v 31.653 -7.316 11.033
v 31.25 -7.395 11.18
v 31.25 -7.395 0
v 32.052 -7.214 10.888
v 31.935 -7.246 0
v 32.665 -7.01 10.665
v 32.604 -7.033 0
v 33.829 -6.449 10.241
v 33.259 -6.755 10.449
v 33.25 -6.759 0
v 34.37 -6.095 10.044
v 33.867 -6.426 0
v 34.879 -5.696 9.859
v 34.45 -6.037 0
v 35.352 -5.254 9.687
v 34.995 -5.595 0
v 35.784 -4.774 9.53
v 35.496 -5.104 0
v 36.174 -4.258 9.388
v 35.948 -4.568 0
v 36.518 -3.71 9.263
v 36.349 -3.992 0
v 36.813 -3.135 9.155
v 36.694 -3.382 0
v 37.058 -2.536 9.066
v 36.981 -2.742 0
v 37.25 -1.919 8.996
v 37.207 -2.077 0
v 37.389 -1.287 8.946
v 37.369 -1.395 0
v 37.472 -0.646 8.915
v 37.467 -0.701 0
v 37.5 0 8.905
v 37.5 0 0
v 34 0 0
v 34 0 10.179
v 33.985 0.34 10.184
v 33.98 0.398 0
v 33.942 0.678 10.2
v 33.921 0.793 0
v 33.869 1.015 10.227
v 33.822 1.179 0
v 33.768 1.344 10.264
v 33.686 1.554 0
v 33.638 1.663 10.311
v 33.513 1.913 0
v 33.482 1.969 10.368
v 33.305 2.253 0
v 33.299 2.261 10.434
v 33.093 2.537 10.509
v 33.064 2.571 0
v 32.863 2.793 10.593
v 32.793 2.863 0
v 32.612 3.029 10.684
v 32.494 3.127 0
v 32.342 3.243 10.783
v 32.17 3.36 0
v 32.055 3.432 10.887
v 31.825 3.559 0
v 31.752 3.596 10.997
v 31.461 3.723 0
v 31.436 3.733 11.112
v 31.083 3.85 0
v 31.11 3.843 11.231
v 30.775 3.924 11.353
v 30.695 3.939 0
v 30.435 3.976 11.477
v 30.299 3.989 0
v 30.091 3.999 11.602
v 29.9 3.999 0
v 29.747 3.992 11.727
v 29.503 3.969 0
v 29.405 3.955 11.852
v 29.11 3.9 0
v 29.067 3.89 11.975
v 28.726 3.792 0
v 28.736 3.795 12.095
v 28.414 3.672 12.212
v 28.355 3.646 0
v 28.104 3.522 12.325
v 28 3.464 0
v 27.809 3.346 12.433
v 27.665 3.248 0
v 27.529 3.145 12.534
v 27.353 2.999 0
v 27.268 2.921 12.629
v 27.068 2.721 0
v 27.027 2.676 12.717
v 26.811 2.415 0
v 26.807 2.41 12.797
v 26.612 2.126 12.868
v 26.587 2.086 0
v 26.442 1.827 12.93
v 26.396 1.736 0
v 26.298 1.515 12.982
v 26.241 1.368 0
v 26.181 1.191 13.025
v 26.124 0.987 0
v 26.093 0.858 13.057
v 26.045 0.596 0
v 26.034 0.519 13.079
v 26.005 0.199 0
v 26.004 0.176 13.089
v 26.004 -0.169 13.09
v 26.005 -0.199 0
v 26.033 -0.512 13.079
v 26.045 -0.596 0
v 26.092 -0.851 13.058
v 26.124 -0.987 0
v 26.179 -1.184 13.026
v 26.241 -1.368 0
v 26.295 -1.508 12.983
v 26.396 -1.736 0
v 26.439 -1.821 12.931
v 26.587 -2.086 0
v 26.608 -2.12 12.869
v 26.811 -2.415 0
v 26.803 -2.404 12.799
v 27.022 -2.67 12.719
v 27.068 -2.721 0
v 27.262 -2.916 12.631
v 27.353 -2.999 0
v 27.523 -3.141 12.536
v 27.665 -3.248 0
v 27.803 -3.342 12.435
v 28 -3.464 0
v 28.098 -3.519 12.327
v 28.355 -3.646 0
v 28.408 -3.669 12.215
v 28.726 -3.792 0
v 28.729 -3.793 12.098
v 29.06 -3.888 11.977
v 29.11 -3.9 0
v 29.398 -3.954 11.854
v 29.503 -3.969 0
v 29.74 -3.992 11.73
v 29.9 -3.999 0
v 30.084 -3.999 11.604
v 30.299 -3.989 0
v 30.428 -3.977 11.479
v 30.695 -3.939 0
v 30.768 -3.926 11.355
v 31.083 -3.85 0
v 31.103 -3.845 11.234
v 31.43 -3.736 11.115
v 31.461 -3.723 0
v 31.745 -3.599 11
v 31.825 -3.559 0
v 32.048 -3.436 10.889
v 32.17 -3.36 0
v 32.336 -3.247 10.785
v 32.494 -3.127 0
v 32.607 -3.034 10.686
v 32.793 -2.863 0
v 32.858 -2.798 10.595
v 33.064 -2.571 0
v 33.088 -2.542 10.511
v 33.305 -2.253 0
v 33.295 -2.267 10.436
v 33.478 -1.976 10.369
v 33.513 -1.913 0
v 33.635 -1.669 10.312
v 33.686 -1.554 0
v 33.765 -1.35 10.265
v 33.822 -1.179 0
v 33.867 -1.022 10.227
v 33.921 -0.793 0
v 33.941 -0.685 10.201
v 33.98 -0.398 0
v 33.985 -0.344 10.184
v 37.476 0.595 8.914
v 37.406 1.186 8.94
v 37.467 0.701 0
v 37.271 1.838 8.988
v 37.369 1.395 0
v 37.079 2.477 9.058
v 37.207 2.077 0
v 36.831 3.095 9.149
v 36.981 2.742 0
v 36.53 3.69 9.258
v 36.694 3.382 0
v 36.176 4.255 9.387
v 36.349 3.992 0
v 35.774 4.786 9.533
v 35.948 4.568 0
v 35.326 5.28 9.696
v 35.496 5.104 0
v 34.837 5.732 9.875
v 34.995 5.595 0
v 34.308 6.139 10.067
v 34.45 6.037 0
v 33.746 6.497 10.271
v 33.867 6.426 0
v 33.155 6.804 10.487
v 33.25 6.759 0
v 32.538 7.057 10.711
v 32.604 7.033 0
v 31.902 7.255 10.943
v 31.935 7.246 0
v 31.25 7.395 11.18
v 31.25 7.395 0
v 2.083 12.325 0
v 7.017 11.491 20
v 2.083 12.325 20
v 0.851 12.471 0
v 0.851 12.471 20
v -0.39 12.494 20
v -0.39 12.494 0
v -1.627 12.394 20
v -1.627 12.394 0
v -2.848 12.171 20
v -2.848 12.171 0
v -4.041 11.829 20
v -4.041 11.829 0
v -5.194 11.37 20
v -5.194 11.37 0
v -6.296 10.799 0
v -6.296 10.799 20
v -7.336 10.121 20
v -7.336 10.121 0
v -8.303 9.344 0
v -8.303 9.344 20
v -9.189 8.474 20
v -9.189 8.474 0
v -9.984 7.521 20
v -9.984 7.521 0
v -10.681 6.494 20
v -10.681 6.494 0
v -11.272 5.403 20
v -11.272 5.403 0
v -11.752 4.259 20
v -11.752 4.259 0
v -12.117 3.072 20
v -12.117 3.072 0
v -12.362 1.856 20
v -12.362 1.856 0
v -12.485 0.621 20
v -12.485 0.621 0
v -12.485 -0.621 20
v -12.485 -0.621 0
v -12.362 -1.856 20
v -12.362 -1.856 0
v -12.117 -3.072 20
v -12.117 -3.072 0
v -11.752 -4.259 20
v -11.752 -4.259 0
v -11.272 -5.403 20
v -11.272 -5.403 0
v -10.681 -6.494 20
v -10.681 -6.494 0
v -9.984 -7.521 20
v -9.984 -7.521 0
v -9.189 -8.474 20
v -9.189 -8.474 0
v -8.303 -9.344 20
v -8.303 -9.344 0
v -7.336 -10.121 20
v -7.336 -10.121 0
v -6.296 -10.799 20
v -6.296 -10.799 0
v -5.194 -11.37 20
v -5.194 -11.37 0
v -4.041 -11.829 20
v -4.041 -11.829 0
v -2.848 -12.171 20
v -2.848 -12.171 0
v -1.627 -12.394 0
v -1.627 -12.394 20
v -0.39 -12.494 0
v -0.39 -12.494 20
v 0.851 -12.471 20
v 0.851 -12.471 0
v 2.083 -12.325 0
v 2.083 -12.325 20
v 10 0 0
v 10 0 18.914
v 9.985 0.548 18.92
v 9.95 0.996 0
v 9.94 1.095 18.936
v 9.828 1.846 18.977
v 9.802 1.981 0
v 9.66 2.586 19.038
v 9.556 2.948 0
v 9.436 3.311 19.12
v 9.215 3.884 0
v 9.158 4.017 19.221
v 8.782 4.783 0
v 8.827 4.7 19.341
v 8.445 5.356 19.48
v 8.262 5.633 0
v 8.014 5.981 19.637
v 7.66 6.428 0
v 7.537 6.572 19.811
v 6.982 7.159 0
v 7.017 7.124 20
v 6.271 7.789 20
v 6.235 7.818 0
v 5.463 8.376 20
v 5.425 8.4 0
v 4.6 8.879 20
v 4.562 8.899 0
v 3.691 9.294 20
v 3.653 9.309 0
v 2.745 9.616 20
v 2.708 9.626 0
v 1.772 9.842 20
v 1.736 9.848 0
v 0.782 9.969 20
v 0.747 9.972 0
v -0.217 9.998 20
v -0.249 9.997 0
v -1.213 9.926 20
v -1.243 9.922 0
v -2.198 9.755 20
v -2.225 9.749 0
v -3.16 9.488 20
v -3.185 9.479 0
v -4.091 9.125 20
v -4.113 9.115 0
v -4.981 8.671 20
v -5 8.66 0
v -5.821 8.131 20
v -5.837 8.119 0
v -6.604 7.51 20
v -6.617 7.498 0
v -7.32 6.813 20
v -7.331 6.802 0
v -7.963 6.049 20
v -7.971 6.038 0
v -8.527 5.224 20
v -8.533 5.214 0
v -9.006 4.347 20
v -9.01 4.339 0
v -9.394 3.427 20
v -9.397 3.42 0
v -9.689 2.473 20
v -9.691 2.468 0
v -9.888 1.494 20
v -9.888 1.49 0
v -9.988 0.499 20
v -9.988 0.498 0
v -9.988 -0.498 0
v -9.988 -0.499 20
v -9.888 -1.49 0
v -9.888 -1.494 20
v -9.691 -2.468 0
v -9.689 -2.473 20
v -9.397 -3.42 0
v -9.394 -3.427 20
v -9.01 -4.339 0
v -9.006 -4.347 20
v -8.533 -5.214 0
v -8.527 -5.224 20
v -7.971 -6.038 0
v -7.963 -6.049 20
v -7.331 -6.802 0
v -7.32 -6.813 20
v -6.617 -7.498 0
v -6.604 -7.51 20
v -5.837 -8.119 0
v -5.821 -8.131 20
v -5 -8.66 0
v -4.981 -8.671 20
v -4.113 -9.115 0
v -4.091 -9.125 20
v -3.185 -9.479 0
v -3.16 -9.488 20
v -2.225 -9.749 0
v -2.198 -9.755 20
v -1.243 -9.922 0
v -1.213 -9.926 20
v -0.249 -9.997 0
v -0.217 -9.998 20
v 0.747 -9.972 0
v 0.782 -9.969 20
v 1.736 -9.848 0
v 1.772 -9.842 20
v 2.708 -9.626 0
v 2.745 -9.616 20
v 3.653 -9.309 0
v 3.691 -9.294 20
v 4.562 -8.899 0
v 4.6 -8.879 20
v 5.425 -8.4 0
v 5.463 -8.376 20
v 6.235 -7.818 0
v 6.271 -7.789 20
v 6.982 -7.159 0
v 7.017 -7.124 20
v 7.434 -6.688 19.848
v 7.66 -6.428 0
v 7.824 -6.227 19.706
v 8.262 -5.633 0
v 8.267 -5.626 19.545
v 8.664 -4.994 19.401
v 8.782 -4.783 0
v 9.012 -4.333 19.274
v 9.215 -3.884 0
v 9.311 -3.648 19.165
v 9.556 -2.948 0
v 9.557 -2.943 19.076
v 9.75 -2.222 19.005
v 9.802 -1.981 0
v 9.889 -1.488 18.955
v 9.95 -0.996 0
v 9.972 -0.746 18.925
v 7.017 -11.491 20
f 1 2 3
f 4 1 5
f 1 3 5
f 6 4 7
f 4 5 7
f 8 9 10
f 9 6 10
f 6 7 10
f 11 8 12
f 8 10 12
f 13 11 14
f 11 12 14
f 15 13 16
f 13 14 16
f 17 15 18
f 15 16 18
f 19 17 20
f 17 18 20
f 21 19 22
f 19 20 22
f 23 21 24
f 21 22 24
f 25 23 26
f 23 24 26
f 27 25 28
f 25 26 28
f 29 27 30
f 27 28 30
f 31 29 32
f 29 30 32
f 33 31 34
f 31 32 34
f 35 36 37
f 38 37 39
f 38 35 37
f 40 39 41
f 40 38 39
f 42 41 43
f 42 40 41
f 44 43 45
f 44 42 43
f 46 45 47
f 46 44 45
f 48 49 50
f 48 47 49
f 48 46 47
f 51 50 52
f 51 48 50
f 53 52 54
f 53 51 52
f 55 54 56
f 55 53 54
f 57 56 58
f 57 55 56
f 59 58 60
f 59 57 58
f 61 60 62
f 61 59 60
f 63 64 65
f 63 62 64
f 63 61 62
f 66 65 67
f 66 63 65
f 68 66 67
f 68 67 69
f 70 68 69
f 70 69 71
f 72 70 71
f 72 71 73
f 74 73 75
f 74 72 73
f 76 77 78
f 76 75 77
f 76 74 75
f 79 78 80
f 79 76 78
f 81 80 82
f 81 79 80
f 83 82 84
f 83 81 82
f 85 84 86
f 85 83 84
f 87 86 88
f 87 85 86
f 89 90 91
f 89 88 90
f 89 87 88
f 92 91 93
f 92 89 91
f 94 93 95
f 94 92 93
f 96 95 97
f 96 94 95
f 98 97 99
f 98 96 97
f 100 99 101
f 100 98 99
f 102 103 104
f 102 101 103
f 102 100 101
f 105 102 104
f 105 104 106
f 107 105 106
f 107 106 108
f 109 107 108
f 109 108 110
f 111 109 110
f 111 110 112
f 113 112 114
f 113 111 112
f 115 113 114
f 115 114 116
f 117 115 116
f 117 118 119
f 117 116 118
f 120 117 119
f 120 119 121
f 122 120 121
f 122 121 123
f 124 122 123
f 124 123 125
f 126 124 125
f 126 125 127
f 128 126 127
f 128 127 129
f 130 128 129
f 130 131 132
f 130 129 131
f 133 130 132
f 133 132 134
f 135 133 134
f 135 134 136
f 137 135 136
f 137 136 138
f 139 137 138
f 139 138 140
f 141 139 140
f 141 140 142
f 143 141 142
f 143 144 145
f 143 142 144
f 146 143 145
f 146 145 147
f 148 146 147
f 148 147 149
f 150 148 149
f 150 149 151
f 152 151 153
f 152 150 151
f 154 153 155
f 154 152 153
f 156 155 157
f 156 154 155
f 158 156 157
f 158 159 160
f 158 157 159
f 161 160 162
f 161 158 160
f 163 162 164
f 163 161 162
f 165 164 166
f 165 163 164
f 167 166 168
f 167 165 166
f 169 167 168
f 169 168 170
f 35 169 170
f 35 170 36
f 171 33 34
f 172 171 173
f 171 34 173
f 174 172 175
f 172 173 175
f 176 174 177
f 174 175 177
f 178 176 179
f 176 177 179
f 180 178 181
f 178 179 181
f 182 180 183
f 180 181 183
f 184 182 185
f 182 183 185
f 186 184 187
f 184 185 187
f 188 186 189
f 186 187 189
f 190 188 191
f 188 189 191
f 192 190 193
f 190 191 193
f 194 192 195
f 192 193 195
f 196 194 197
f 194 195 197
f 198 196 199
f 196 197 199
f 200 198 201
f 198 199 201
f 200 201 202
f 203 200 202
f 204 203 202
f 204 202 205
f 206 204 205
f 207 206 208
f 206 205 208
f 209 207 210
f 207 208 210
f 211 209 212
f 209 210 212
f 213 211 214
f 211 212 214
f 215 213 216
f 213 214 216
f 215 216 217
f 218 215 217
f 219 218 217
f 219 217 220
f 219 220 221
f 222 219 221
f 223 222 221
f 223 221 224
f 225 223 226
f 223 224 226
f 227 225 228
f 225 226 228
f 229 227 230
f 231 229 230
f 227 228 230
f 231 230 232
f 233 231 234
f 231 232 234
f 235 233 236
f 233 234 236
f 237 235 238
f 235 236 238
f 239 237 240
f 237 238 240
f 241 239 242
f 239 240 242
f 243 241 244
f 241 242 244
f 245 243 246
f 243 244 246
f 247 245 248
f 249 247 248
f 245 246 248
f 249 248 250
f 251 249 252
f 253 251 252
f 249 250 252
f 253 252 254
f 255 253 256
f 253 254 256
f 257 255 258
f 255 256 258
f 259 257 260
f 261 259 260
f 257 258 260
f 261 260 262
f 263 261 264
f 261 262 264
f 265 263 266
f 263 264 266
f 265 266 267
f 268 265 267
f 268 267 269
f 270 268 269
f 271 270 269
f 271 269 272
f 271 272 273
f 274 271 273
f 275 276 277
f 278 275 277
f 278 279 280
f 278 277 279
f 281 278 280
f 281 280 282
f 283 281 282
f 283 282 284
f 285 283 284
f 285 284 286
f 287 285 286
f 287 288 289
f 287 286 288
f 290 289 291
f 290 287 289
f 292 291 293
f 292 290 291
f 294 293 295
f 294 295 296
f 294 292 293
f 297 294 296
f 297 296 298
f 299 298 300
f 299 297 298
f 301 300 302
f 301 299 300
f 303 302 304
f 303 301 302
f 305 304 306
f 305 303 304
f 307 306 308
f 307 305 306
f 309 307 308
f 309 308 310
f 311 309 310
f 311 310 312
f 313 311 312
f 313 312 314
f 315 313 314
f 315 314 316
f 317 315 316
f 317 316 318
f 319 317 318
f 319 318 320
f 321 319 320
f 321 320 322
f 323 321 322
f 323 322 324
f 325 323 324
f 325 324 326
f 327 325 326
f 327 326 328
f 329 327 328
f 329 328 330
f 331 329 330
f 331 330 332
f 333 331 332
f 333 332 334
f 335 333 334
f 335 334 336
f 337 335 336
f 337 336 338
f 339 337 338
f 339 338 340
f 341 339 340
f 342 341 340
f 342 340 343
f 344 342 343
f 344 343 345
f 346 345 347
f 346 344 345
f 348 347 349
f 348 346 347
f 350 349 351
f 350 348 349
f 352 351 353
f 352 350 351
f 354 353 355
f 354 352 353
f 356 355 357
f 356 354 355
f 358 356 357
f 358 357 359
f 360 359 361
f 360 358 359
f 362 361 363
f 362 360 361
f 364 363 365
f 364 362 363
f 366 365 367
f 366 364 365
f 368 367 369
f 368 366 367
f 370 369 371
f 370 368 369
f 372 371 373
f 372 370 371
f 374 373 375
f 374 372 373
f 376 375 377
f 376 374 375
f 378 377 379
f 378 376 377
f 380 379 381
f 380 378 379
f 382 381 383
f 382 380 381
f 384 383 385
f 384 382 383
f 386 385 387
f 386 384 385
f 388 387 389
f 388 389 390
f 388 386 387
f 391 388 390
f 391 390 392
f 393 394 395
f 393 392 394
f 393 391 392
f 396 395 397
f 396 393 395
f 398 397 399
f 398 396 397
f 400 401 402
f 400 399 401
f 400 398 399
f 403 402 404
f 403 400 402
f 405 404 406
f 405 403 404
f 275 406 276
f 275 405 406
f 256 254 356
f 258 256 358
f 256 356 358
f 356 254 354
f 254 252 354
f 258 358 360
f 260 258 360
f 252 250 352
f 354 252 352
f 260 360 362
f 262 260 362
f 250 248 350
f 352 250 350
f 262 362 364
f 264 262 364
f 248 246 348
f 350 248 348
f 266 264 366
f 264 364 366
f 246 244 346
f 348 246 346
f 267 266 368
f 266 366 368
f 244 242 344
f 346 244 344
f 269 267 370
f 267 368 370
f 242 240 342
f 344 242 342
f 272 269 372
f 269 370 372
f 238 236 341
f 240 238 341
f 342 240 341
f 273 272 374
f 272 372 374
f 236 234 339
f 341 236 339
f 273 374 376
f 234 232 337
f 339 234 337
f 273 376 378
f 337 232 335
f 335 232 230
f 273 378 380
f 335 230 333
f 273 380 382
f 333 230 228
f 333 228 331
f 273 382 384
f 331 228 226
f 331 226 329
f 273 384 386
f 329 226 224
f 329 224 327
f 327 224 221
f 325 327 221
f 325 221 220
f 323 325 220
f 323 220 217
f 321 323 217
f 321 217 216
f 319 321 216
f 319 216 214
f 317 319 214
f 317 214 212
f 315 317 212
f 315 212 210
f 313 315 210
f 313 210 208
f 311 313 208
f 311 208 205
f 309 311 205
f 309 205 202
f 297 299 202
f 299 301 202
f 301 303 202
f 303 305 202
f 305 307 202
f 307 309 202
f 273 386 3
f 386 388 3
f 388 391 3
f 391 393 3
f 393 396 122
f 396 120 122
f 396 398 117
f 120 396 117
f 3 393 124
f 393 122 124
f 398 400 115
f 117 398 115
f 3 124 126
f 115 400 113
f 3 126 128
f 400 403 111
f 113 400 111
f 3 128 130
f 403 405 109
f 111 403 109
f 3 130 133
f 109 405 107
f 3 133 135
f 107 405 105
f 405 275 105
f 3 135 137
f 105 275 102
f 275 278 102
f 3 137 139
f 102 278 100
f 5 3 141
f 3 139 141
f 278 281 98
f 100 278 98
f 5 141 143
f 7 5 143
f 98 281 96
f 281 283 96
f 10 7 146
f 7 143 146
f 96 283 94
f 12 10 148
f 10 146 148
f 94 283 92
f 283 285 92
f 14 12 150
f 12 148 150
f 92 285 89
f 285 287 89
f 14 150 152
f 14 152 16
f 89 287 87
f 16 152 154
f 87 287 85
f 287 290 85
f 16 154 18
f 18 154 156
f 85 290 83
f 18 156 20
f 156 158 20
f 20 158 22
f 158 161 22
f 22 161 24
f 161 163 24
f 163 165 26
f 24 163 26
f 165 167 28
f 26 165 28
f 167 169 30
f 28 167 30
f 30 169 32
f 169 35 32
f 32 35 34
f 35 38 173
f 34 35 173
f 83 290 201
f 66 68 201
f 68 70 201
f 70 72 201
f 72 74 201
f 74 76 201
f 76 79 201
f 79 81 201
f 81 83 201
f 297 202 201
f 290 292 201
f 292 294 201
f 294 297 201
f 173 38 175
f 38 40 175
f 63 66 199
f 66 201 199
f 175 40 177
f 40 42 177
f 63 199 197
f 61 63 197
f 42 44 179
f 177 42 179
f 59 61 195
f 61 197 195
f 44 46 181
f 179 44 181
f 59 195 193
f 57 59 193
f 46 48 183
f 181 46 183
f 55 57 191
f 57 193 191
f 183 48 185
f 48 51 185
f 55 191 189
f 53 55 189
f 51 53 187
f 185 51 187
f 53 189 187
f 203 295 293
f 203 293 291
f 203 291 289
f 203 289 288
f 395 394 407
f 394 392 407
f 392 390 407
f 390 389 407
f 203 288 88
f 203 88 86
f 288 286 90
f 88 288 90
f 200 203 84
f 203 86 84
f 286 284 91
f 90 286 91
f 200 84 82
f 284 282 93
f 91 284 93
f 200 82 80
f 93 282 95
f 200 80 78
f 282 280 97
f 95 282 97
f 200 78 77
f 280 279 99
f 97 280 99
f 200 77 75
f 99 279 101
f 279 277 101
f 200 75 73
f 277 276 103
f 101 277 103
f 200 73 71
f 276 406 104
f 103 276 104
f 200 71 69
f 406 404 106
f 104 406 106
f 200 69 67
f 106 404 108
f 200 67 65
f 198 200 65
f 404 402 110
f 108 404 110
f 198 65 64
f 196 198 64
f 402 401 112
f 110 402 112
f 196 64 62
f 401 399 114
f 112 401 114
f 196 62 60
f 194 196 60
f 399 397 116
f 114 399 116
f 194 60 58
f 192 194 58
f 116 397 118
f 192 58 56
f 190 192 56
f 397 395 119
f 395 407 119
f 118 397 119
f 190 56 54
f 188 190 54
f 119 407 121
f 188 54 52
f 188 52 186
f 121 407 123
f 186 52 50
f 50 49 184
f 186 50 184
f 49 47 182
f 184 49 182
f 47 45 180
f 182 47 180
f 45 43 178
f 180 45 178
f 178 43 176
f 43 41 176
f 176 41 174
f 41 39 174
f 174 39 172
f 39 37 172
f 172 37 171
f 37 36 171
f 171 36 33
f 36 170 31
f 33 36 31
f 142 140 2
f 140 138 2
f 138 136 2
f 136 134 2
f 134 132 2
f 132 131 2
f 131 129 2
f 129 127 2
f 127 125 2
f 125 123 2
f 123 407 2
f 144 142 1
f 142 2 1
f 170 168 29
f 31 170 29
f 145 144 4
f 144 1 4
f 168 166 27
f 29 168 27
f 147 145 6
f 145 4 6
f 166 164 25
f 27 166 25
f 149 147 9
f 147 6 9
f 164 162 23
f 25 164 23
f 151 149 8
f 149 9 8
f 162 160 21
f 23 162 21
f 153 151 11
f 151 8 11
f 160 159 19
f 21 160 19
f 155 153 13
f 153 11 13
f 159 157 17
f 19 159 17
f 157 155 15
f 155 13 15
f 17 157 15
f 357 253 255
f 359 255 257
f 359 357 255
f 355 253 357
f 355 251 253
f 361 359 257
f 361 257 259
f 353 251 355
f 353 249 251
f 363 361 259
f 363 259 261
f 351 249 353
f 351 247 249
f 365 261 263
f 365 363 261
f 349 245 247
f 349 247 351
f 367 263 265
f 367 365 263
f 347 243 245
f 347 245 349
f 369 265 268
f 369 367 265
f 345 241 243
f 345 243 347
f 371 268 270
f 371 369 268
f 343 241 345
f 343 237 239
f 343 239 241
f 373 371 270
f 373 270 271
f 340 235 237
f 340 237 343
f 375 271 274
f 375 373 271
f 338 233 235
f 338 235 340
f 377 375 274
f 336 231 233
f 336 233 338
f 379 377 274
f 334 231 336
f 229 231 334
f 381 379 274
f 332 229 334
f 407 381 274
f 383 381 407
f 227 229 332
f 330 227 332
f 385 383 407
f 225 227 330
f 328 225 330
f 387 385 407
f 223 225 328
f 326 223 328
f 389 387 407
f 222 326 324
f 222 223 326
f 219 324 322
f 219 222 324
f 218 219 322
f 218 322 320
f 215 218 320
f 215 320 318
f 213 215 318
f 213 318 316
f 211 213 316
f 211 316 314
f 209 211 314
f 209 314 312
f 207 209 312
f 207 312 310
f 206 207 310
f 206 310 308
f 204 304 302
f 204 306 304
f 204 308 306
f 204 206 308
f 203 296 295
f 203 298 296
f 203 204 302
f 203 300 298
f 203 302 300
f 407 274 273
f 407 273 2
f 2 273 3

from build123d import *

# Parameters (mm, degrees)
F0_R     = 10
F0_R_2   = 4
F1_DEPTH = 20
F3_DEPTH = 12.5


with BuildPart() as f1:
    # F0 (on Top) → F1 (new body)
    with BuildSketch(Plane.XY):
        with BuildLine():
            ThreePointArc((2.083333, -12.325166), (9.547033, -8.068715), (12.5, 0))
            ThreePointArc((12.5, 0), (9.547033, 8.068715), (2.083333, 12.325166))
            ThreePointArc((2.083333, 12.325166), (-12.5, 0), (2.083333, -12.325166))
        make_face()
        Circle(F0_R, mode=Mode.SUBTRACT)
        with BuildLine():
            ThreePointArc((37.5, 0), (35.72822, 4.841229), (31.25, 7.3951))
            ThreePointArc((31.25, 7.3951), (22.5, 0), (31.25, -7.3951))
            ThreePointArc((31.25, -7.3951), (35.72822, -4.841229), (37.5, 0))
        make_face()
        with Locations((30, 0)):
            Circle(F0_R_2, mode=Mode.SUBTRACT)
        with BuildLine():
            ThreePointArc((2.083333, 12.325166), (9.547033, 8.068715), (12.5, 0))
            ThreePointArc((12.5, 0), (9.547033, -8.068715), (2.083333, -12.325166))
            Line((2.083333, -12.325166), (31.25, -7.3951))
            ThreePointArc((31.25, -7.3951), (22.5, 0), (31.25, 7.3951))
            Line((31.25, 7.3951), (2.083333, 12.325166))
        make_face()
    extrude(amount=F1_DEPTH)

    # F2 (on Front) → F3 (cut, symmetric)
    with BuildSketch(Plane.XZ):
        Polygon((43.665298, 20), (7.017286, 20), (43.665298, 6.661214), align=None)
    extrude(amount=F3_DEPTH, both=True, mode=Mode.SUBTRACT)


solid = f1.part
